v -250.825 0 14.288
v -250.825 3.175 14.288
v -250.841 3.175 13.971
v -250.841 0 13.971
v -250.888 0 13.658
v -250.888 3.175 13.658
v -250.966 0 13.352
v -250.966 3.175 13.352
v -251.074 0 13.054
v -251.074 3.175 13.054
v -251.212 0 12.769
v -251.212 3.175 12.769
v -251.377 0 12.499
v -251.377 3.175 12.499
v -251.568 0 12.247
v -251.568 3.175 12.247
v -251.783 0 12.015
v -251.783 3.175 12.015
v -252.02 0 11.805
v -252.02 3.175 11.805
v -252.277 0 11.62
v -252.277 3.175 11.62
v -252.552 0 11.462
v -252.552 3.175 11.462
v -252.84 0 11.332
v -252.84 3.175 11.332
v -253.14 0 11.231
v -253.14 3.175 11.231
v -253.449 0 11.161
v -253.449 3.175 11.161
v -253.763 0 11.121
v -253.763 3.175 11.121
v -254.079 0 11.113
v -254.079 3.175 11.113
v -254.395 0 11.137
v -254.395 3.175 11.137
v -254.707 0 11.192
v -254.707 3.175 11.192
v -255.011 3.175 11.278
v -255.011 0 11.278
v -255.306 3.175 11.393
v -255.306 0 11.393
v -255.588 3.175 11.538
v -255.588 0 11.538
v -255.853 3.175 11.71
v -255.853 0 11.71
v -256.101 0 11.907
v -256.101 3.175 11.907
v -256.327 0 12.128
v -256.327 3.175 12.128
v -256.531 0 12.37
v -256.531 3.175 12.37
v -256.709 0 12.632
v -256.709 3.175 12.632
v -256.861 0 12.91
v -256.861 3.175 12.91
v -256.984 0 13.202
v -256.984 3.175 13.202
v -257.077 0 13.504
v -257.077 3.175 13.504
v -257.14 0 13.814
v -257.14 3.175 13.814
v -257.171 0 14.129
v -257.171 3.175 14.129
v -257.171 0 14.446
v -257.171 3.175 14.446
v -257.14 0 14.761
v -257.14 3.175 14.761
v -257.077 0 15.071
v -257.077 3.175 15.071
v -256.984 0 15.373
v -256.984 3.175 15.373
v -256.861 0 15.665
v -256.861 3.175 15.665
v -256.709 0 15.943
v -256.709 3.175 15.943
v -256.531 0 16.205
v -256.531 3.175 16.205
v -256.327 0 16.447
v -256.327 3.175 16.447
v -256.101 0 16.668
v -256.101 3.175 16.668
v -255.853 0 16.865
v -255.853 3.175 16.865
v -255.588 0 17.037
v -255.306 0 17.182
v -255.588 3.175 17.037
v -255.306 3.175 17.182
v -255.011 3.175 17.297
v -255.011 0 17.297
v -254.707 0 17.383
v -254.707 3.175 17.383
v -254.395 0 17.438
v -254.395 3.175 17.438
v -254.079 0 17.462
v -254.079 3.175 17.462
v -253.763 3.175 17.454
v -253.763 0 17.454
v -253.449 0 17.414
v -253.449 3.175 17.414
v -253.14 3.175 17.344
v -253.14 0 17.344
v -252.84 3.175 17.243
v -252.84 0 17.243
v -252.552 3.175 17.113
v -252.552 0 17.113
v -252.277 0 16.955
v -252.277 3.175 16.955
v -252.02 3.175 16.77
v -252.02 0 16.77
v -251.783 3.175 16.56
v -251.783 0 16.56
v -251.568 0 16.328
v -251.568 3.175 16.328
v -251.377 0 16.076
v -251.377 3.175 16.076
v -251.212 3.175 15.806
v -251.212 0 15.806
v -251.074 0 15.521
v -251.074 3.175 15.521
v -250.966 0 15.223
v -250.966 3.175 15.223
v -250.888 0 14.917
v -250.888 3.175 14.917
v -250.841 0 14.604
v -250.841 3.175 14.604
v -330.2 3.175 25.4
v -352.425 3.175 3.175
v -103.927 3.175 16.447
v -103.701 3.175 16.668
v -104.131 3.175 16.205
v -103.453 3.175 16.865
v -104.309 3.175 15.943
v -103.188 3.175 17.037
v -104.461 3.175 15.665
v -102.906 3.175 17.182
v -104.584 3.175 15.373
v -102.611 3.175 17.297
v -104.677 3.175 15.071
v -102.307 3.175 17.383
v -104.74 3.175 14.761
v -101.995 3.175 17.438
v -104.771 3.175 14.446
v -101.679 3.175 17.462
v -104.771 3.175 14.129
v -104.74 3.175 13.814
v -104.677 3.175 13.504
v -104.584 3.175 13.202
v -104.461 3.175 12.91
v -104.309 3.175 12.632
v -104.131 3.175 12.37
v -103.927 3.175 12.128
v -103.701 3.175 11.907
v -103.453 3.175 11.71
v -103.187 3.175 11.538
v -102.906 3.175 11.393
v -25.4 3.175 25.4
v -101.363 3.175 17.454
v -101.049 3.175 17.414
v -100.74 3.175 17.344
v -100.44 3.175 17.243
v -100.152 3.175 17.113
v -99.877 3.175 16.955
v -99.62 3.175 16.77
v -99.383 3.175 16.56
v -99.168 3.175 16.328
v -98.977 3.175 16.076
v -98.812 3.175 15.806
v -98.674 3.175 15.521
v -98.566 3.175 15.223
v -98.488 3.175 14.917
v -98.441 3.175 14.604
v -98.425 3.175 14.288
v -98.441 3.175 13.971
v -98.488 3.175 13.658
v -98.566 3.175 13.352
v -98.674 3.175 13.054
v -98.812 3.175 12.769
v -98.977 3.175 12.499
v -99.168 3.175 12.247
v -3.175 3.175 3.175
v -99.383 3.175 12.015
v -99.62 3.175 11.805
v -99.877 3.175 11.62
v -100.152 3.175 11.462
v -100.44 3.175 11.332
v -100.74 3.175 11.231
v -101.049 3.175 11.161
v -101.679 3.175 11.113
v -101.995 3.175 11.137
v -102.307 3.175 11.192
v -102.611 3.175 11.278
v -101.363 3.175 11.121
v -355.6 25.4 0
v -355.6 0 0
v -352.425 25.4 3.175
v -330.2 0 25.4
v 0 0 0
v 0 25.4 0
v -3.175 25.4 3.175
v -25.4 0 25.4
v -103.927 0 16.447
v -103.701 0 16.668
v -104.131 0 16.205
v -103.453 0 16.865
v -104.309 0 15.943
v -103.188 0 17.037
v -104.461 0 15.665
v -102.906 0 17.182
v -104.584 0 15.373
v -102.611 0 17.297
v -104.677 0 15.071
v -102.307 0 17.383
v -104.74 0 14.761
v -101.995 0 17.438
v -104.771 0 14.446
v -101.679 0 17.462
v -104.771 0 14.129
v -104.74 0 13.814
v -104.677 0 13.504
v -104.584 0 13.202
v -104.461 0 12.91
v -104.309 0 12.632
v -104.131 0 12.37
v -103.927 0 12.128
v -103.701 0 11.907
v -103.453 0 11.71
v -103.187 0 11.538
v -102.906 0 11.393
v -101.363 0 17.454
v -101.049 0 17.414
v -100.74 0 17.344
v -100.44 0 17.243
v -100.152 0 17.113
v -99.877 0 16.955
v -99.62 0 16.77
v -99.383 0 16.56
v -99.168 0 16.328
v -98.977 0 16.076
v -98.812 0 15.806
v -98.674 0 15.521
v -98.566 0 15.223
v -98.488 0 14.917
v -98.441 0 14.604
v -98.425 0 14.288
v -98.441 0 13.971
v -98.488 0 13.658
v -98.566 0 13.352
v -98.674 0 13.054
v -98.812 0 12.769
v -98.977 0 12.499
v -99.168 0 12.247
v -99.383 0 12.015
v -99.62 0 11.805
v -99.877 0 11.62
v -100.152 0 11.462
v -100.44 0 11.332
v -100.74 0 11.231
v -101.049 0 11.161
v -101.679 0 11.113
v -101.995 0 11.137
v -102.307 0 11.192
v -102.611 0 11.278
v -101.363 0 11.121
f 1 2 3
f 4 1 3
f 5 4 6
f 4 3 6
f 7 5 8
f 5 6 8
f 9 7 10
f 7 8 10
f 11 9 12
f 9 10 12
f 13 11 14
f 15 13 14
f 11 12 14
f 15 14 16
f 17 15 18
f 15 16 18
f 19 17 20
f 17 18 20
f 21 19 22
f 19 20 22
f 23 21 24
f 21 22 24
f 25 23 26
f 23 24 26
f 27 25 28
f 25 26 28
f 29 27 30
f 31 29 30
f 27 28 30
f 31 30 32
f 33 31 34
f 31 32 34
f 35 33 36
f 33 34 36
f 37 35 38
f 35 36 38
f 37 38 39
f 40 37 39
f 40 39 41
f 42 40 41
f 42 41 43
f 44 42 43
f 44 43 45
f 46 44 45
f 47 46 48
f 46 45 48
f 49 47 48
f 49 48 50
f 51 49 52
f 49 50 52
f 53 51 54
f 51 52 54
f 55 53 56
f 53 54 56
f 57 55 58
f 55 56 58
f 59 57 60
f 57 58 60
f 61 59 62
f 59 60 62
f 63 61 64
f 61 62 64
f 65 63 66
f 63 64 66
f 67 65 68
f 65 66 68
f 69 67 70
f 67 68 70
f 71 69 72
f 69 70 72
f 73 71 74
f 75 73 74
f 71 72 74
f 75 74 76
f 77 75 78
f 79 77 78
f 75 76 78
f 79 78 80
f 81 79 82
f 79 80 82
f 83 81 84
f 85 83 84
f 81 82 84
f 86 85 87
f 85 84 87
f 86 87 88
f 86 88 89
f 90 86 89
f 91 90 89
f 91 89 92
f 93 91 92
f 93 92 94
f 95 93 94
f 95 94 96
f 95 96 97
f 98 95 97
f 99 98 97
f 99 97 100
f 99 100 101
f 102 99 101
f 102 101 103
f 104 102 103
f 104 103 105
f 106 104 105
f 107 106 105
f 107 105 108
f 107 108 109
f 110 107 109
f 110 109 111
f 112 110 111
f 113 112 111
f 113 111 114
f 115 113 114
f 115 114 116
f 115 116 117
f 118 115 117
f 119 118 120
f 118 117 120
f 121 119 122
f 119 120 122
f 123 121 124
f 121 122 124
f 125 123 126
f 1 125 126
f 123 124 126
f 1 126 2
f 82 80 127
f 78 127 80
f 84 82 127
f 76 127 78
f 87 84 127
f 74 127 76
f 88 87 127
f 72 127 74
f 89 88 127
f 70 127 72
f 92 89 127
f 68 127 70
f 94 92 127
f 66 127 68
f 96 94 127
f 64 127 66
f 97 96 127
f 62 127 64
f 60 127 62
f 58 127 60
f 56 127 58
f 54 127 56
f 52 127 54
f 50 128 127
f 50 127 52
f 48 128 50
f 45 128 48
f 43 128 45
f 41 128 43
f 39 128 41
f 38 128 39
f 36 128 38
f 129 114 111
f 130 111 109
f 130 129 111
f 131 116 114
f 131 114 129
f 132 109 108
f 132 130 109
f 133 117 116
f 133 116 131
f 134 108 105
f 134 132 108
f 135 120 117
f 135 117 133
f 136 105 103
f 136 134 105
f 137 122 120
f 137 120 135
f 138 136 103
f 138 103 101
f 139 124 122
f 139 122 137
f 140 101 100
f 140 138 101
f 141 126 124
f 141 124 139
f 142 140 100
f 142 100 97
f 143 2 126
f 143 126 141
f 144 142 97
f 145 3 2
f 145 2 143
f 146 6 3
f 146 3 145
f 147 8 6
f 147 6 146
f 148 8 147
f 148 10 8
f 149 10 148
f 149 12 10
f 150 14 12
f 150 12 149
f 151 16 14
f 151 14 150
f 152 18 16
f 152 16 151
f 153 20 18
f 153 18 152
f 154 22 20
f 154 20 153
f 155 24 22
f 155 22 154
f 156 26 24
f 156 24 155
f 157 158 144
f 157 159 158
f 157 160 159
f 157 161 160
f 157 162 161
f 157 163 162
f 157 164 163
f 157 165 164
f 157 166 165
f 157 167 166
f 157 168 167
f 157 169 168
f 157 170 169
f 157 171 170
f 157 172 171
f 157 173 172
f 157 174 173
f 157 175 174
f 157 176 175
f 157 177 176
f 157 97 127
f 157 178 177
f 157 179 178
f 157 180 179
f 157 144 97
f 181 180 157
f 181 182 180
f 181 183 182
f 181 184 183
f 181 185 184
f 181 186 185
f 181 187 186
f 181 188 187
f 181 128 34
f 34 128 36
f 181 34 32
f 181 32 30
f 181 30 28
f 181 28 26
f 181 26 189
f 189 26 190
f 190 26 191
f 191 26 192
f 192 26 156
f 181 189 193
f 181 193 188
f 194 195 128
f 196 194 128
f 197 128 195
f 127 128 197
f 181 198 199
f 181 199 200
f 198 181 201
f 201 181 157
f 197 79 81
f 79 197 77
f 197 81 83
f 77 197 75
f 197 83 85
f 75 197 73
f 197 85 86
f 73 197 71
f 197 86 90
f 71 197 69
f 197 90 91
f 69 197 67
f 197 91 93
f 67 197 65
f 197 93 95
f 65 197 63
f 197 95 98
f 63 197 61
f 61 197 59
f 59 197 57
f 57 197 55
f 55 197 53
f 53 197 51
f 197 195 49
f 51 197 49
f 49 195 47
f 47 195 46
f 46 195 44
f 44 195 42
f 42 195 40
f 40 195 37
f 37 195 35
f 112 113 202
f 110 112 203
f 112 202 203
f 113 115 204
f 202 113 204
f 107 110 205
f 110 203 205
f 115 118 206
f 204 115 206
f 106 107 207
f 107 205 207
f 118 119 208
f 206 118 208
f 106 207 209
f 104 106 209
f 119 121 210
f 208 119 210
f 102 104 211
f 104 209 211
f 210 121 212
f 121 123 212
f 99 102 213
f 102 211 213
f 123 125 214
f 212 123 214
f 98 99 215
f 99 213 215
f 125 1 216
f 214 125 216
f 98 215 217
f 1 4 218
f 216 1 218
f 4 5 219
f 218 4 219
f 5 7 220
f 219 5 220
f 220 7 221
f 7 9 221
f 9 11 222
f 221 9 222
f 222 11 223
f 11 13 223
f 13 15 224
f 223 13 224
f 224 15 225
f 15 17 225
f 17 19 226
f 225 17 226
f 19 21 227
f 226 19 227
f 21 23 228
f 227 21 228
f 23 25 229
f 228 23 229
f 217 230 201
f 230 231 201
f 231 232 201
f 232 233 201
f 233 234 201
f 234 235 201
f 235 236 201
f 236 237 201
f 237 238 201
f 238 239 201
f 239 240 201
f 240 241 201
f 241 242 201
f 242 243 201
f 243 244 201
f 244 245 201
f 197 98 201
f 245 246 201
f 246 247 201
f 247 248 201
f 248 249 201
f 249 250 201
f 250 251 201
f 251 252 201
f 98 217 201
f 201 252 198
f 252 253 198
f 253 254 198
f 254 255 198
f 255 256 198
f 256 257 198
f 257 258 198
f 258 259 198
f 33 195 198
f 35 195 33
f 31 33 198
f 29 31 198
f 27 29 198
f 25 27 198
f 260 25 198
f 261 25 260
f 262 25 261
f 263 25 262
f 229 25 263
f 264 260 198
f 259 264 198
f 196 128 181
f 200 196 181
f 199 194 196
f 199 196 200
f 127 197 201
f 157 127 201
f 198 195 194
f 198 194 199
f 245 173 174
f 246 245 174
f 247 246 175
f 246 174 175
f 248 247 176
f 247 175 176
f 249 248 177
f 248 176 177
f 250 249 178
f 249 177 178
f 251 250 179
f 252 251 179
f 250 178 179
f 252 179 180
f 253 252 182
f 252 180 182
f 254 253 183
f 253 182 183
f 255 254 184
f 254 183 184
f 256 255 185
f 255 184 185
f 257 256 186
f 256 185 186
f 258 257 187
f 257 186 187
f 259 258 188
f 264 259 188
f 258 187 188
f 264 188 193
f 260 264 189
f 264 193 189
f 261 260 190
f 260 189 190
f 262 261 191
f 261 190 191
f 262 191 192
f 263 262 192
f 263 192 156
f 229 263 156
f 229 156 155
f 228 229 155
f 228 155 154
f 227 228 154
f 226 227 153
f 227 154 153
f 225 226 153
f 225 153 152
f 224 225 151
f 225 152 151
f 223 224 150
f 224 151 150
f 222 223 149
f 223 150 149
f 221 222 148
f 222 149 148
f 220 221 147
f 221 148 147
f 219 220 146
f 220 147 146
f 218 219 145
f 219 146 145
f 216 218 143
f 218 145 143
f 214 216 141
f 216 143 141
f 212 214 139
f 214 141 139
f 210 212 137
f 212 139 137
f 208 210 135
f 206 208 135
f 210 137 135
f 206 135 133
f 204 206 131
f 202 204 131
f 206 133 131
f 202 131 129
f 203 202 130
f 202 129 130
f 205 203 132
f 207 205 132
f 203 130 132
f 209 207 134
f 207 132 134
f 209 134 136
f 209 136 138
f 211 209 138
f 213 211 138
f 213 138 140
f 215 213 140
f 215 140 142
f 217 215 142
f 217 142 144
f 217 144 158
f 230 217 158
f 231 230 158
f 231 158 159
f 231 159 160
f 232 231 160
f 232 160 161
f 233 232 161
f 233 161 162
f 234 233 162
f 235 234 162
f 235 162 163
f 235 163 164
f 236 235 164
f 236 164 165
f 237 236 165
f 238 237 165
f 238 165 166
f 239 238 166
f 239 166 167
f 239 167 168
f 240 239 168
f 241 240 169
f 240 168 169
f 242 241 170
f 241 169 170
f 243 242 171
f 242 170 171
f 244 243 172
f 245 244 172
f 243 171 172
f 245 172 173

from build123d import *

# Parameters (mm, degrees)
SKETCH2_W           = 355.6
SKETCH2_H           = 25.4
BOSS_EXTRUDE1_DEPTH = 3.175
SKETCH3_W           = 355.6
SKETCH3_H           = 3.175
BOSS_EXTRUDE2_DEPTH = 22.225
CUT_EXTRUDE3_DEPTH  = 25.4
SKETCH7_R           = 3.175
CUT_EXTRUDE4_DEPTH  = 3.175


with BuildPart() as part:
    # Sketch2 → Boss-Extrude1 (new body)
    with BuildSketch(Plane(origin=(0, 0, 0), x_dir=(1, 0, 0), z_dir=(0, 1, 0))):
        with Locations((-177.8, -12.7)):
            Rectangle(SKETCH2_W, SKETCH2_H)
    extrude(amount=BOSS_EXTRUDE1_DEPTH)

    # Sketch3 → Boss-Extrude2 (add)
    with BuildSketch(Plane(origin=(0, 3.175, 0), x_dir=(1, 0, 0), z_dir=(0, 1, 0))):
        with Locations((-177.8, -1.5875)):
            Rectangle(SKETCH3_W, SKETCH3_H)
    extrude(amount=BOSS_EXTRUDE2_DEPTH)

    # Sketch6 → Cut-Extrude3 (cut)
    with BuildSketch(Plane(origin=(0, 25.4, 0), x_dir=(1, 0, 0), z_dir=(0, 1, 0))):
        Polygon((-355.6, 0), (-314.465679006, -41.134320994), (-387.836085875, -49.332490233), align=None)
        Polygon((0, 0), (-41.658764664, -41.658764664), (40.75579897, -53.520309566), align=None)
    extrude(amount=-CUT_EXTRUDE3_DEPTH, mode=Mode.SUBTRACT)

    # Sketch7 → Cut-Extrude4 (cut)
    with BuildSketch(Plane(origin=(0, 3.175, 0), x_dir=(1, 0, 0), z_dir=(0, 1, 0))):
        with Locations((-101.6, -14.2875)):
            Circle(SKETCH7_R)
        with Locations((-254, -14.2875)):
            Circle(SKETCH7_R)
    extrude(amount=-CUT_EXTRUDE4_DEPTH, mode=Mode.SUBTRACT)


solid = part.part
